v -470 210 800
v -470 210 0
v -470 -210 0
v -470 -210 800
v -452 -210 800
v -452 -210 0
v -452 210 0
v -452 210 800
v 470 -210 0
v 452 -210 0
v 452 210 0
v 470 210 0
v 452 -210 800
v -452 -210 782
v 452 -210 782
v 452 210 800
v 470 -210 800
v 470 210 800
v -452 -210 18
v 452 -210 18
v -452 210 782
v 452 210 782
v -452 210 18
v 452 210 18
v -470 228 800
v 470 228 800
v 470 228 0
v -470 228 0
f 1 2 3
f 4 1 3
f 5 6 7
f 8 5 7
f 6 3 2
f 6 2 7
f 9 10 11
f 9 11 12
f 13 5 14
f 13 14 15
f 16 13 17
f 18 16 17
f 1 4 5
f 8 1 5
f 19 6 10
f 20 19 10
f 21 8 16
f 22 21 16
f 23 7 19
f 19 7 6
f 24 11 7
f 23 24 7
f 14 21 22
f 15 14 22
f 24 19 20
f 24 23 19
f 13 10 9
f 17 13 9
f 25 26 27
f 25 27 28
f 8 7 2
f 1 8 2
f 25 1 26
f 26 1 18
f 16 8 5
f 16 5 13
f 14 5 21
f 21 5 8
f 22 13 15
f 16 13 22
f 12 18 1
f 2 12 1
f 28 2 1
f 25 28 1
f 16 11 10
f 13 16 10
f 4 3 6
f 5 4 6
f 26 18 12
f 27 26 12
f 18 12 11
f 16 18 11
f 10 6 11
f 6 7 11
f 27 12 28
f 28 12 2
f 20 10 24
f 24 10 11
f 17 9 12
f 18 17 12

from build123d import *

# Parameters (mm, degrees)
F1_DEPTH = 800
F2_W     = 904
F2_H     = 420
F3_DEPTH = 18
F5_DEPTH = 18
F6_W     = 904
F6_H     = 18
F7_DEPTH = 18


with BuildPart() as f1:
    # F0 (on Top) → F1 (new body)
    with BuildSketch(Plane.XY):
        Polygon((-470, -210), (-452, -210), (-452, -192), (-452, 192), (-452, 210), (-470, 210), align=None)
    extrude(amount=F1_DEPTH)


with BuildPart() as f1b:
    # F0 (on Top) → F1, piece 2 (new body)
    with BuildSketch(Plane.XY):
        Polygon((452, -210), (470, -210), (470, 210), (452, 210), (452, 192), (452, -192), align=None)
    extrude(amount=F1_DEPTH)


with BuildPart() as f3:
    # F2 (on face) → F3 (new body)
    with BuildSketch(Plane.XY.offset(800)):
        Rectangle(F2_W, F2_H)
    extrude(amount=-F3_DEPTH)


with BuildPart() as f5:
    # F4 (on face) → F5 (new body)
    with BuildSketch(Plane.XY):
        Polygon((-452, -192), (-452, -210), (452, -210), (452, 210), (-452, 210), (-452, 192), align=None)
    extrude(amount=F5_DEPTH)


with BuildPart() as f7:
    # F6 (on face) → F7 (new body)
    with BuildSketch(Plane(origin=(0, 210, 0), x_dir=(-1, 0, 0), z_dir=(0, 1, 0))):
        Polygon((-452, 800), (-470, 800), (-470, 0), (470, 0), (470, 800), (452, 800), (452, 782), (-452, 782), align=None)
        with Locations((0, 791)):
            Rectangle(F6_W, F6_H)
    extrude(amount=F7_DEPTH)


solid = Compound([f1.part, f1b.part, f3.part, f5.part, f7.part])
